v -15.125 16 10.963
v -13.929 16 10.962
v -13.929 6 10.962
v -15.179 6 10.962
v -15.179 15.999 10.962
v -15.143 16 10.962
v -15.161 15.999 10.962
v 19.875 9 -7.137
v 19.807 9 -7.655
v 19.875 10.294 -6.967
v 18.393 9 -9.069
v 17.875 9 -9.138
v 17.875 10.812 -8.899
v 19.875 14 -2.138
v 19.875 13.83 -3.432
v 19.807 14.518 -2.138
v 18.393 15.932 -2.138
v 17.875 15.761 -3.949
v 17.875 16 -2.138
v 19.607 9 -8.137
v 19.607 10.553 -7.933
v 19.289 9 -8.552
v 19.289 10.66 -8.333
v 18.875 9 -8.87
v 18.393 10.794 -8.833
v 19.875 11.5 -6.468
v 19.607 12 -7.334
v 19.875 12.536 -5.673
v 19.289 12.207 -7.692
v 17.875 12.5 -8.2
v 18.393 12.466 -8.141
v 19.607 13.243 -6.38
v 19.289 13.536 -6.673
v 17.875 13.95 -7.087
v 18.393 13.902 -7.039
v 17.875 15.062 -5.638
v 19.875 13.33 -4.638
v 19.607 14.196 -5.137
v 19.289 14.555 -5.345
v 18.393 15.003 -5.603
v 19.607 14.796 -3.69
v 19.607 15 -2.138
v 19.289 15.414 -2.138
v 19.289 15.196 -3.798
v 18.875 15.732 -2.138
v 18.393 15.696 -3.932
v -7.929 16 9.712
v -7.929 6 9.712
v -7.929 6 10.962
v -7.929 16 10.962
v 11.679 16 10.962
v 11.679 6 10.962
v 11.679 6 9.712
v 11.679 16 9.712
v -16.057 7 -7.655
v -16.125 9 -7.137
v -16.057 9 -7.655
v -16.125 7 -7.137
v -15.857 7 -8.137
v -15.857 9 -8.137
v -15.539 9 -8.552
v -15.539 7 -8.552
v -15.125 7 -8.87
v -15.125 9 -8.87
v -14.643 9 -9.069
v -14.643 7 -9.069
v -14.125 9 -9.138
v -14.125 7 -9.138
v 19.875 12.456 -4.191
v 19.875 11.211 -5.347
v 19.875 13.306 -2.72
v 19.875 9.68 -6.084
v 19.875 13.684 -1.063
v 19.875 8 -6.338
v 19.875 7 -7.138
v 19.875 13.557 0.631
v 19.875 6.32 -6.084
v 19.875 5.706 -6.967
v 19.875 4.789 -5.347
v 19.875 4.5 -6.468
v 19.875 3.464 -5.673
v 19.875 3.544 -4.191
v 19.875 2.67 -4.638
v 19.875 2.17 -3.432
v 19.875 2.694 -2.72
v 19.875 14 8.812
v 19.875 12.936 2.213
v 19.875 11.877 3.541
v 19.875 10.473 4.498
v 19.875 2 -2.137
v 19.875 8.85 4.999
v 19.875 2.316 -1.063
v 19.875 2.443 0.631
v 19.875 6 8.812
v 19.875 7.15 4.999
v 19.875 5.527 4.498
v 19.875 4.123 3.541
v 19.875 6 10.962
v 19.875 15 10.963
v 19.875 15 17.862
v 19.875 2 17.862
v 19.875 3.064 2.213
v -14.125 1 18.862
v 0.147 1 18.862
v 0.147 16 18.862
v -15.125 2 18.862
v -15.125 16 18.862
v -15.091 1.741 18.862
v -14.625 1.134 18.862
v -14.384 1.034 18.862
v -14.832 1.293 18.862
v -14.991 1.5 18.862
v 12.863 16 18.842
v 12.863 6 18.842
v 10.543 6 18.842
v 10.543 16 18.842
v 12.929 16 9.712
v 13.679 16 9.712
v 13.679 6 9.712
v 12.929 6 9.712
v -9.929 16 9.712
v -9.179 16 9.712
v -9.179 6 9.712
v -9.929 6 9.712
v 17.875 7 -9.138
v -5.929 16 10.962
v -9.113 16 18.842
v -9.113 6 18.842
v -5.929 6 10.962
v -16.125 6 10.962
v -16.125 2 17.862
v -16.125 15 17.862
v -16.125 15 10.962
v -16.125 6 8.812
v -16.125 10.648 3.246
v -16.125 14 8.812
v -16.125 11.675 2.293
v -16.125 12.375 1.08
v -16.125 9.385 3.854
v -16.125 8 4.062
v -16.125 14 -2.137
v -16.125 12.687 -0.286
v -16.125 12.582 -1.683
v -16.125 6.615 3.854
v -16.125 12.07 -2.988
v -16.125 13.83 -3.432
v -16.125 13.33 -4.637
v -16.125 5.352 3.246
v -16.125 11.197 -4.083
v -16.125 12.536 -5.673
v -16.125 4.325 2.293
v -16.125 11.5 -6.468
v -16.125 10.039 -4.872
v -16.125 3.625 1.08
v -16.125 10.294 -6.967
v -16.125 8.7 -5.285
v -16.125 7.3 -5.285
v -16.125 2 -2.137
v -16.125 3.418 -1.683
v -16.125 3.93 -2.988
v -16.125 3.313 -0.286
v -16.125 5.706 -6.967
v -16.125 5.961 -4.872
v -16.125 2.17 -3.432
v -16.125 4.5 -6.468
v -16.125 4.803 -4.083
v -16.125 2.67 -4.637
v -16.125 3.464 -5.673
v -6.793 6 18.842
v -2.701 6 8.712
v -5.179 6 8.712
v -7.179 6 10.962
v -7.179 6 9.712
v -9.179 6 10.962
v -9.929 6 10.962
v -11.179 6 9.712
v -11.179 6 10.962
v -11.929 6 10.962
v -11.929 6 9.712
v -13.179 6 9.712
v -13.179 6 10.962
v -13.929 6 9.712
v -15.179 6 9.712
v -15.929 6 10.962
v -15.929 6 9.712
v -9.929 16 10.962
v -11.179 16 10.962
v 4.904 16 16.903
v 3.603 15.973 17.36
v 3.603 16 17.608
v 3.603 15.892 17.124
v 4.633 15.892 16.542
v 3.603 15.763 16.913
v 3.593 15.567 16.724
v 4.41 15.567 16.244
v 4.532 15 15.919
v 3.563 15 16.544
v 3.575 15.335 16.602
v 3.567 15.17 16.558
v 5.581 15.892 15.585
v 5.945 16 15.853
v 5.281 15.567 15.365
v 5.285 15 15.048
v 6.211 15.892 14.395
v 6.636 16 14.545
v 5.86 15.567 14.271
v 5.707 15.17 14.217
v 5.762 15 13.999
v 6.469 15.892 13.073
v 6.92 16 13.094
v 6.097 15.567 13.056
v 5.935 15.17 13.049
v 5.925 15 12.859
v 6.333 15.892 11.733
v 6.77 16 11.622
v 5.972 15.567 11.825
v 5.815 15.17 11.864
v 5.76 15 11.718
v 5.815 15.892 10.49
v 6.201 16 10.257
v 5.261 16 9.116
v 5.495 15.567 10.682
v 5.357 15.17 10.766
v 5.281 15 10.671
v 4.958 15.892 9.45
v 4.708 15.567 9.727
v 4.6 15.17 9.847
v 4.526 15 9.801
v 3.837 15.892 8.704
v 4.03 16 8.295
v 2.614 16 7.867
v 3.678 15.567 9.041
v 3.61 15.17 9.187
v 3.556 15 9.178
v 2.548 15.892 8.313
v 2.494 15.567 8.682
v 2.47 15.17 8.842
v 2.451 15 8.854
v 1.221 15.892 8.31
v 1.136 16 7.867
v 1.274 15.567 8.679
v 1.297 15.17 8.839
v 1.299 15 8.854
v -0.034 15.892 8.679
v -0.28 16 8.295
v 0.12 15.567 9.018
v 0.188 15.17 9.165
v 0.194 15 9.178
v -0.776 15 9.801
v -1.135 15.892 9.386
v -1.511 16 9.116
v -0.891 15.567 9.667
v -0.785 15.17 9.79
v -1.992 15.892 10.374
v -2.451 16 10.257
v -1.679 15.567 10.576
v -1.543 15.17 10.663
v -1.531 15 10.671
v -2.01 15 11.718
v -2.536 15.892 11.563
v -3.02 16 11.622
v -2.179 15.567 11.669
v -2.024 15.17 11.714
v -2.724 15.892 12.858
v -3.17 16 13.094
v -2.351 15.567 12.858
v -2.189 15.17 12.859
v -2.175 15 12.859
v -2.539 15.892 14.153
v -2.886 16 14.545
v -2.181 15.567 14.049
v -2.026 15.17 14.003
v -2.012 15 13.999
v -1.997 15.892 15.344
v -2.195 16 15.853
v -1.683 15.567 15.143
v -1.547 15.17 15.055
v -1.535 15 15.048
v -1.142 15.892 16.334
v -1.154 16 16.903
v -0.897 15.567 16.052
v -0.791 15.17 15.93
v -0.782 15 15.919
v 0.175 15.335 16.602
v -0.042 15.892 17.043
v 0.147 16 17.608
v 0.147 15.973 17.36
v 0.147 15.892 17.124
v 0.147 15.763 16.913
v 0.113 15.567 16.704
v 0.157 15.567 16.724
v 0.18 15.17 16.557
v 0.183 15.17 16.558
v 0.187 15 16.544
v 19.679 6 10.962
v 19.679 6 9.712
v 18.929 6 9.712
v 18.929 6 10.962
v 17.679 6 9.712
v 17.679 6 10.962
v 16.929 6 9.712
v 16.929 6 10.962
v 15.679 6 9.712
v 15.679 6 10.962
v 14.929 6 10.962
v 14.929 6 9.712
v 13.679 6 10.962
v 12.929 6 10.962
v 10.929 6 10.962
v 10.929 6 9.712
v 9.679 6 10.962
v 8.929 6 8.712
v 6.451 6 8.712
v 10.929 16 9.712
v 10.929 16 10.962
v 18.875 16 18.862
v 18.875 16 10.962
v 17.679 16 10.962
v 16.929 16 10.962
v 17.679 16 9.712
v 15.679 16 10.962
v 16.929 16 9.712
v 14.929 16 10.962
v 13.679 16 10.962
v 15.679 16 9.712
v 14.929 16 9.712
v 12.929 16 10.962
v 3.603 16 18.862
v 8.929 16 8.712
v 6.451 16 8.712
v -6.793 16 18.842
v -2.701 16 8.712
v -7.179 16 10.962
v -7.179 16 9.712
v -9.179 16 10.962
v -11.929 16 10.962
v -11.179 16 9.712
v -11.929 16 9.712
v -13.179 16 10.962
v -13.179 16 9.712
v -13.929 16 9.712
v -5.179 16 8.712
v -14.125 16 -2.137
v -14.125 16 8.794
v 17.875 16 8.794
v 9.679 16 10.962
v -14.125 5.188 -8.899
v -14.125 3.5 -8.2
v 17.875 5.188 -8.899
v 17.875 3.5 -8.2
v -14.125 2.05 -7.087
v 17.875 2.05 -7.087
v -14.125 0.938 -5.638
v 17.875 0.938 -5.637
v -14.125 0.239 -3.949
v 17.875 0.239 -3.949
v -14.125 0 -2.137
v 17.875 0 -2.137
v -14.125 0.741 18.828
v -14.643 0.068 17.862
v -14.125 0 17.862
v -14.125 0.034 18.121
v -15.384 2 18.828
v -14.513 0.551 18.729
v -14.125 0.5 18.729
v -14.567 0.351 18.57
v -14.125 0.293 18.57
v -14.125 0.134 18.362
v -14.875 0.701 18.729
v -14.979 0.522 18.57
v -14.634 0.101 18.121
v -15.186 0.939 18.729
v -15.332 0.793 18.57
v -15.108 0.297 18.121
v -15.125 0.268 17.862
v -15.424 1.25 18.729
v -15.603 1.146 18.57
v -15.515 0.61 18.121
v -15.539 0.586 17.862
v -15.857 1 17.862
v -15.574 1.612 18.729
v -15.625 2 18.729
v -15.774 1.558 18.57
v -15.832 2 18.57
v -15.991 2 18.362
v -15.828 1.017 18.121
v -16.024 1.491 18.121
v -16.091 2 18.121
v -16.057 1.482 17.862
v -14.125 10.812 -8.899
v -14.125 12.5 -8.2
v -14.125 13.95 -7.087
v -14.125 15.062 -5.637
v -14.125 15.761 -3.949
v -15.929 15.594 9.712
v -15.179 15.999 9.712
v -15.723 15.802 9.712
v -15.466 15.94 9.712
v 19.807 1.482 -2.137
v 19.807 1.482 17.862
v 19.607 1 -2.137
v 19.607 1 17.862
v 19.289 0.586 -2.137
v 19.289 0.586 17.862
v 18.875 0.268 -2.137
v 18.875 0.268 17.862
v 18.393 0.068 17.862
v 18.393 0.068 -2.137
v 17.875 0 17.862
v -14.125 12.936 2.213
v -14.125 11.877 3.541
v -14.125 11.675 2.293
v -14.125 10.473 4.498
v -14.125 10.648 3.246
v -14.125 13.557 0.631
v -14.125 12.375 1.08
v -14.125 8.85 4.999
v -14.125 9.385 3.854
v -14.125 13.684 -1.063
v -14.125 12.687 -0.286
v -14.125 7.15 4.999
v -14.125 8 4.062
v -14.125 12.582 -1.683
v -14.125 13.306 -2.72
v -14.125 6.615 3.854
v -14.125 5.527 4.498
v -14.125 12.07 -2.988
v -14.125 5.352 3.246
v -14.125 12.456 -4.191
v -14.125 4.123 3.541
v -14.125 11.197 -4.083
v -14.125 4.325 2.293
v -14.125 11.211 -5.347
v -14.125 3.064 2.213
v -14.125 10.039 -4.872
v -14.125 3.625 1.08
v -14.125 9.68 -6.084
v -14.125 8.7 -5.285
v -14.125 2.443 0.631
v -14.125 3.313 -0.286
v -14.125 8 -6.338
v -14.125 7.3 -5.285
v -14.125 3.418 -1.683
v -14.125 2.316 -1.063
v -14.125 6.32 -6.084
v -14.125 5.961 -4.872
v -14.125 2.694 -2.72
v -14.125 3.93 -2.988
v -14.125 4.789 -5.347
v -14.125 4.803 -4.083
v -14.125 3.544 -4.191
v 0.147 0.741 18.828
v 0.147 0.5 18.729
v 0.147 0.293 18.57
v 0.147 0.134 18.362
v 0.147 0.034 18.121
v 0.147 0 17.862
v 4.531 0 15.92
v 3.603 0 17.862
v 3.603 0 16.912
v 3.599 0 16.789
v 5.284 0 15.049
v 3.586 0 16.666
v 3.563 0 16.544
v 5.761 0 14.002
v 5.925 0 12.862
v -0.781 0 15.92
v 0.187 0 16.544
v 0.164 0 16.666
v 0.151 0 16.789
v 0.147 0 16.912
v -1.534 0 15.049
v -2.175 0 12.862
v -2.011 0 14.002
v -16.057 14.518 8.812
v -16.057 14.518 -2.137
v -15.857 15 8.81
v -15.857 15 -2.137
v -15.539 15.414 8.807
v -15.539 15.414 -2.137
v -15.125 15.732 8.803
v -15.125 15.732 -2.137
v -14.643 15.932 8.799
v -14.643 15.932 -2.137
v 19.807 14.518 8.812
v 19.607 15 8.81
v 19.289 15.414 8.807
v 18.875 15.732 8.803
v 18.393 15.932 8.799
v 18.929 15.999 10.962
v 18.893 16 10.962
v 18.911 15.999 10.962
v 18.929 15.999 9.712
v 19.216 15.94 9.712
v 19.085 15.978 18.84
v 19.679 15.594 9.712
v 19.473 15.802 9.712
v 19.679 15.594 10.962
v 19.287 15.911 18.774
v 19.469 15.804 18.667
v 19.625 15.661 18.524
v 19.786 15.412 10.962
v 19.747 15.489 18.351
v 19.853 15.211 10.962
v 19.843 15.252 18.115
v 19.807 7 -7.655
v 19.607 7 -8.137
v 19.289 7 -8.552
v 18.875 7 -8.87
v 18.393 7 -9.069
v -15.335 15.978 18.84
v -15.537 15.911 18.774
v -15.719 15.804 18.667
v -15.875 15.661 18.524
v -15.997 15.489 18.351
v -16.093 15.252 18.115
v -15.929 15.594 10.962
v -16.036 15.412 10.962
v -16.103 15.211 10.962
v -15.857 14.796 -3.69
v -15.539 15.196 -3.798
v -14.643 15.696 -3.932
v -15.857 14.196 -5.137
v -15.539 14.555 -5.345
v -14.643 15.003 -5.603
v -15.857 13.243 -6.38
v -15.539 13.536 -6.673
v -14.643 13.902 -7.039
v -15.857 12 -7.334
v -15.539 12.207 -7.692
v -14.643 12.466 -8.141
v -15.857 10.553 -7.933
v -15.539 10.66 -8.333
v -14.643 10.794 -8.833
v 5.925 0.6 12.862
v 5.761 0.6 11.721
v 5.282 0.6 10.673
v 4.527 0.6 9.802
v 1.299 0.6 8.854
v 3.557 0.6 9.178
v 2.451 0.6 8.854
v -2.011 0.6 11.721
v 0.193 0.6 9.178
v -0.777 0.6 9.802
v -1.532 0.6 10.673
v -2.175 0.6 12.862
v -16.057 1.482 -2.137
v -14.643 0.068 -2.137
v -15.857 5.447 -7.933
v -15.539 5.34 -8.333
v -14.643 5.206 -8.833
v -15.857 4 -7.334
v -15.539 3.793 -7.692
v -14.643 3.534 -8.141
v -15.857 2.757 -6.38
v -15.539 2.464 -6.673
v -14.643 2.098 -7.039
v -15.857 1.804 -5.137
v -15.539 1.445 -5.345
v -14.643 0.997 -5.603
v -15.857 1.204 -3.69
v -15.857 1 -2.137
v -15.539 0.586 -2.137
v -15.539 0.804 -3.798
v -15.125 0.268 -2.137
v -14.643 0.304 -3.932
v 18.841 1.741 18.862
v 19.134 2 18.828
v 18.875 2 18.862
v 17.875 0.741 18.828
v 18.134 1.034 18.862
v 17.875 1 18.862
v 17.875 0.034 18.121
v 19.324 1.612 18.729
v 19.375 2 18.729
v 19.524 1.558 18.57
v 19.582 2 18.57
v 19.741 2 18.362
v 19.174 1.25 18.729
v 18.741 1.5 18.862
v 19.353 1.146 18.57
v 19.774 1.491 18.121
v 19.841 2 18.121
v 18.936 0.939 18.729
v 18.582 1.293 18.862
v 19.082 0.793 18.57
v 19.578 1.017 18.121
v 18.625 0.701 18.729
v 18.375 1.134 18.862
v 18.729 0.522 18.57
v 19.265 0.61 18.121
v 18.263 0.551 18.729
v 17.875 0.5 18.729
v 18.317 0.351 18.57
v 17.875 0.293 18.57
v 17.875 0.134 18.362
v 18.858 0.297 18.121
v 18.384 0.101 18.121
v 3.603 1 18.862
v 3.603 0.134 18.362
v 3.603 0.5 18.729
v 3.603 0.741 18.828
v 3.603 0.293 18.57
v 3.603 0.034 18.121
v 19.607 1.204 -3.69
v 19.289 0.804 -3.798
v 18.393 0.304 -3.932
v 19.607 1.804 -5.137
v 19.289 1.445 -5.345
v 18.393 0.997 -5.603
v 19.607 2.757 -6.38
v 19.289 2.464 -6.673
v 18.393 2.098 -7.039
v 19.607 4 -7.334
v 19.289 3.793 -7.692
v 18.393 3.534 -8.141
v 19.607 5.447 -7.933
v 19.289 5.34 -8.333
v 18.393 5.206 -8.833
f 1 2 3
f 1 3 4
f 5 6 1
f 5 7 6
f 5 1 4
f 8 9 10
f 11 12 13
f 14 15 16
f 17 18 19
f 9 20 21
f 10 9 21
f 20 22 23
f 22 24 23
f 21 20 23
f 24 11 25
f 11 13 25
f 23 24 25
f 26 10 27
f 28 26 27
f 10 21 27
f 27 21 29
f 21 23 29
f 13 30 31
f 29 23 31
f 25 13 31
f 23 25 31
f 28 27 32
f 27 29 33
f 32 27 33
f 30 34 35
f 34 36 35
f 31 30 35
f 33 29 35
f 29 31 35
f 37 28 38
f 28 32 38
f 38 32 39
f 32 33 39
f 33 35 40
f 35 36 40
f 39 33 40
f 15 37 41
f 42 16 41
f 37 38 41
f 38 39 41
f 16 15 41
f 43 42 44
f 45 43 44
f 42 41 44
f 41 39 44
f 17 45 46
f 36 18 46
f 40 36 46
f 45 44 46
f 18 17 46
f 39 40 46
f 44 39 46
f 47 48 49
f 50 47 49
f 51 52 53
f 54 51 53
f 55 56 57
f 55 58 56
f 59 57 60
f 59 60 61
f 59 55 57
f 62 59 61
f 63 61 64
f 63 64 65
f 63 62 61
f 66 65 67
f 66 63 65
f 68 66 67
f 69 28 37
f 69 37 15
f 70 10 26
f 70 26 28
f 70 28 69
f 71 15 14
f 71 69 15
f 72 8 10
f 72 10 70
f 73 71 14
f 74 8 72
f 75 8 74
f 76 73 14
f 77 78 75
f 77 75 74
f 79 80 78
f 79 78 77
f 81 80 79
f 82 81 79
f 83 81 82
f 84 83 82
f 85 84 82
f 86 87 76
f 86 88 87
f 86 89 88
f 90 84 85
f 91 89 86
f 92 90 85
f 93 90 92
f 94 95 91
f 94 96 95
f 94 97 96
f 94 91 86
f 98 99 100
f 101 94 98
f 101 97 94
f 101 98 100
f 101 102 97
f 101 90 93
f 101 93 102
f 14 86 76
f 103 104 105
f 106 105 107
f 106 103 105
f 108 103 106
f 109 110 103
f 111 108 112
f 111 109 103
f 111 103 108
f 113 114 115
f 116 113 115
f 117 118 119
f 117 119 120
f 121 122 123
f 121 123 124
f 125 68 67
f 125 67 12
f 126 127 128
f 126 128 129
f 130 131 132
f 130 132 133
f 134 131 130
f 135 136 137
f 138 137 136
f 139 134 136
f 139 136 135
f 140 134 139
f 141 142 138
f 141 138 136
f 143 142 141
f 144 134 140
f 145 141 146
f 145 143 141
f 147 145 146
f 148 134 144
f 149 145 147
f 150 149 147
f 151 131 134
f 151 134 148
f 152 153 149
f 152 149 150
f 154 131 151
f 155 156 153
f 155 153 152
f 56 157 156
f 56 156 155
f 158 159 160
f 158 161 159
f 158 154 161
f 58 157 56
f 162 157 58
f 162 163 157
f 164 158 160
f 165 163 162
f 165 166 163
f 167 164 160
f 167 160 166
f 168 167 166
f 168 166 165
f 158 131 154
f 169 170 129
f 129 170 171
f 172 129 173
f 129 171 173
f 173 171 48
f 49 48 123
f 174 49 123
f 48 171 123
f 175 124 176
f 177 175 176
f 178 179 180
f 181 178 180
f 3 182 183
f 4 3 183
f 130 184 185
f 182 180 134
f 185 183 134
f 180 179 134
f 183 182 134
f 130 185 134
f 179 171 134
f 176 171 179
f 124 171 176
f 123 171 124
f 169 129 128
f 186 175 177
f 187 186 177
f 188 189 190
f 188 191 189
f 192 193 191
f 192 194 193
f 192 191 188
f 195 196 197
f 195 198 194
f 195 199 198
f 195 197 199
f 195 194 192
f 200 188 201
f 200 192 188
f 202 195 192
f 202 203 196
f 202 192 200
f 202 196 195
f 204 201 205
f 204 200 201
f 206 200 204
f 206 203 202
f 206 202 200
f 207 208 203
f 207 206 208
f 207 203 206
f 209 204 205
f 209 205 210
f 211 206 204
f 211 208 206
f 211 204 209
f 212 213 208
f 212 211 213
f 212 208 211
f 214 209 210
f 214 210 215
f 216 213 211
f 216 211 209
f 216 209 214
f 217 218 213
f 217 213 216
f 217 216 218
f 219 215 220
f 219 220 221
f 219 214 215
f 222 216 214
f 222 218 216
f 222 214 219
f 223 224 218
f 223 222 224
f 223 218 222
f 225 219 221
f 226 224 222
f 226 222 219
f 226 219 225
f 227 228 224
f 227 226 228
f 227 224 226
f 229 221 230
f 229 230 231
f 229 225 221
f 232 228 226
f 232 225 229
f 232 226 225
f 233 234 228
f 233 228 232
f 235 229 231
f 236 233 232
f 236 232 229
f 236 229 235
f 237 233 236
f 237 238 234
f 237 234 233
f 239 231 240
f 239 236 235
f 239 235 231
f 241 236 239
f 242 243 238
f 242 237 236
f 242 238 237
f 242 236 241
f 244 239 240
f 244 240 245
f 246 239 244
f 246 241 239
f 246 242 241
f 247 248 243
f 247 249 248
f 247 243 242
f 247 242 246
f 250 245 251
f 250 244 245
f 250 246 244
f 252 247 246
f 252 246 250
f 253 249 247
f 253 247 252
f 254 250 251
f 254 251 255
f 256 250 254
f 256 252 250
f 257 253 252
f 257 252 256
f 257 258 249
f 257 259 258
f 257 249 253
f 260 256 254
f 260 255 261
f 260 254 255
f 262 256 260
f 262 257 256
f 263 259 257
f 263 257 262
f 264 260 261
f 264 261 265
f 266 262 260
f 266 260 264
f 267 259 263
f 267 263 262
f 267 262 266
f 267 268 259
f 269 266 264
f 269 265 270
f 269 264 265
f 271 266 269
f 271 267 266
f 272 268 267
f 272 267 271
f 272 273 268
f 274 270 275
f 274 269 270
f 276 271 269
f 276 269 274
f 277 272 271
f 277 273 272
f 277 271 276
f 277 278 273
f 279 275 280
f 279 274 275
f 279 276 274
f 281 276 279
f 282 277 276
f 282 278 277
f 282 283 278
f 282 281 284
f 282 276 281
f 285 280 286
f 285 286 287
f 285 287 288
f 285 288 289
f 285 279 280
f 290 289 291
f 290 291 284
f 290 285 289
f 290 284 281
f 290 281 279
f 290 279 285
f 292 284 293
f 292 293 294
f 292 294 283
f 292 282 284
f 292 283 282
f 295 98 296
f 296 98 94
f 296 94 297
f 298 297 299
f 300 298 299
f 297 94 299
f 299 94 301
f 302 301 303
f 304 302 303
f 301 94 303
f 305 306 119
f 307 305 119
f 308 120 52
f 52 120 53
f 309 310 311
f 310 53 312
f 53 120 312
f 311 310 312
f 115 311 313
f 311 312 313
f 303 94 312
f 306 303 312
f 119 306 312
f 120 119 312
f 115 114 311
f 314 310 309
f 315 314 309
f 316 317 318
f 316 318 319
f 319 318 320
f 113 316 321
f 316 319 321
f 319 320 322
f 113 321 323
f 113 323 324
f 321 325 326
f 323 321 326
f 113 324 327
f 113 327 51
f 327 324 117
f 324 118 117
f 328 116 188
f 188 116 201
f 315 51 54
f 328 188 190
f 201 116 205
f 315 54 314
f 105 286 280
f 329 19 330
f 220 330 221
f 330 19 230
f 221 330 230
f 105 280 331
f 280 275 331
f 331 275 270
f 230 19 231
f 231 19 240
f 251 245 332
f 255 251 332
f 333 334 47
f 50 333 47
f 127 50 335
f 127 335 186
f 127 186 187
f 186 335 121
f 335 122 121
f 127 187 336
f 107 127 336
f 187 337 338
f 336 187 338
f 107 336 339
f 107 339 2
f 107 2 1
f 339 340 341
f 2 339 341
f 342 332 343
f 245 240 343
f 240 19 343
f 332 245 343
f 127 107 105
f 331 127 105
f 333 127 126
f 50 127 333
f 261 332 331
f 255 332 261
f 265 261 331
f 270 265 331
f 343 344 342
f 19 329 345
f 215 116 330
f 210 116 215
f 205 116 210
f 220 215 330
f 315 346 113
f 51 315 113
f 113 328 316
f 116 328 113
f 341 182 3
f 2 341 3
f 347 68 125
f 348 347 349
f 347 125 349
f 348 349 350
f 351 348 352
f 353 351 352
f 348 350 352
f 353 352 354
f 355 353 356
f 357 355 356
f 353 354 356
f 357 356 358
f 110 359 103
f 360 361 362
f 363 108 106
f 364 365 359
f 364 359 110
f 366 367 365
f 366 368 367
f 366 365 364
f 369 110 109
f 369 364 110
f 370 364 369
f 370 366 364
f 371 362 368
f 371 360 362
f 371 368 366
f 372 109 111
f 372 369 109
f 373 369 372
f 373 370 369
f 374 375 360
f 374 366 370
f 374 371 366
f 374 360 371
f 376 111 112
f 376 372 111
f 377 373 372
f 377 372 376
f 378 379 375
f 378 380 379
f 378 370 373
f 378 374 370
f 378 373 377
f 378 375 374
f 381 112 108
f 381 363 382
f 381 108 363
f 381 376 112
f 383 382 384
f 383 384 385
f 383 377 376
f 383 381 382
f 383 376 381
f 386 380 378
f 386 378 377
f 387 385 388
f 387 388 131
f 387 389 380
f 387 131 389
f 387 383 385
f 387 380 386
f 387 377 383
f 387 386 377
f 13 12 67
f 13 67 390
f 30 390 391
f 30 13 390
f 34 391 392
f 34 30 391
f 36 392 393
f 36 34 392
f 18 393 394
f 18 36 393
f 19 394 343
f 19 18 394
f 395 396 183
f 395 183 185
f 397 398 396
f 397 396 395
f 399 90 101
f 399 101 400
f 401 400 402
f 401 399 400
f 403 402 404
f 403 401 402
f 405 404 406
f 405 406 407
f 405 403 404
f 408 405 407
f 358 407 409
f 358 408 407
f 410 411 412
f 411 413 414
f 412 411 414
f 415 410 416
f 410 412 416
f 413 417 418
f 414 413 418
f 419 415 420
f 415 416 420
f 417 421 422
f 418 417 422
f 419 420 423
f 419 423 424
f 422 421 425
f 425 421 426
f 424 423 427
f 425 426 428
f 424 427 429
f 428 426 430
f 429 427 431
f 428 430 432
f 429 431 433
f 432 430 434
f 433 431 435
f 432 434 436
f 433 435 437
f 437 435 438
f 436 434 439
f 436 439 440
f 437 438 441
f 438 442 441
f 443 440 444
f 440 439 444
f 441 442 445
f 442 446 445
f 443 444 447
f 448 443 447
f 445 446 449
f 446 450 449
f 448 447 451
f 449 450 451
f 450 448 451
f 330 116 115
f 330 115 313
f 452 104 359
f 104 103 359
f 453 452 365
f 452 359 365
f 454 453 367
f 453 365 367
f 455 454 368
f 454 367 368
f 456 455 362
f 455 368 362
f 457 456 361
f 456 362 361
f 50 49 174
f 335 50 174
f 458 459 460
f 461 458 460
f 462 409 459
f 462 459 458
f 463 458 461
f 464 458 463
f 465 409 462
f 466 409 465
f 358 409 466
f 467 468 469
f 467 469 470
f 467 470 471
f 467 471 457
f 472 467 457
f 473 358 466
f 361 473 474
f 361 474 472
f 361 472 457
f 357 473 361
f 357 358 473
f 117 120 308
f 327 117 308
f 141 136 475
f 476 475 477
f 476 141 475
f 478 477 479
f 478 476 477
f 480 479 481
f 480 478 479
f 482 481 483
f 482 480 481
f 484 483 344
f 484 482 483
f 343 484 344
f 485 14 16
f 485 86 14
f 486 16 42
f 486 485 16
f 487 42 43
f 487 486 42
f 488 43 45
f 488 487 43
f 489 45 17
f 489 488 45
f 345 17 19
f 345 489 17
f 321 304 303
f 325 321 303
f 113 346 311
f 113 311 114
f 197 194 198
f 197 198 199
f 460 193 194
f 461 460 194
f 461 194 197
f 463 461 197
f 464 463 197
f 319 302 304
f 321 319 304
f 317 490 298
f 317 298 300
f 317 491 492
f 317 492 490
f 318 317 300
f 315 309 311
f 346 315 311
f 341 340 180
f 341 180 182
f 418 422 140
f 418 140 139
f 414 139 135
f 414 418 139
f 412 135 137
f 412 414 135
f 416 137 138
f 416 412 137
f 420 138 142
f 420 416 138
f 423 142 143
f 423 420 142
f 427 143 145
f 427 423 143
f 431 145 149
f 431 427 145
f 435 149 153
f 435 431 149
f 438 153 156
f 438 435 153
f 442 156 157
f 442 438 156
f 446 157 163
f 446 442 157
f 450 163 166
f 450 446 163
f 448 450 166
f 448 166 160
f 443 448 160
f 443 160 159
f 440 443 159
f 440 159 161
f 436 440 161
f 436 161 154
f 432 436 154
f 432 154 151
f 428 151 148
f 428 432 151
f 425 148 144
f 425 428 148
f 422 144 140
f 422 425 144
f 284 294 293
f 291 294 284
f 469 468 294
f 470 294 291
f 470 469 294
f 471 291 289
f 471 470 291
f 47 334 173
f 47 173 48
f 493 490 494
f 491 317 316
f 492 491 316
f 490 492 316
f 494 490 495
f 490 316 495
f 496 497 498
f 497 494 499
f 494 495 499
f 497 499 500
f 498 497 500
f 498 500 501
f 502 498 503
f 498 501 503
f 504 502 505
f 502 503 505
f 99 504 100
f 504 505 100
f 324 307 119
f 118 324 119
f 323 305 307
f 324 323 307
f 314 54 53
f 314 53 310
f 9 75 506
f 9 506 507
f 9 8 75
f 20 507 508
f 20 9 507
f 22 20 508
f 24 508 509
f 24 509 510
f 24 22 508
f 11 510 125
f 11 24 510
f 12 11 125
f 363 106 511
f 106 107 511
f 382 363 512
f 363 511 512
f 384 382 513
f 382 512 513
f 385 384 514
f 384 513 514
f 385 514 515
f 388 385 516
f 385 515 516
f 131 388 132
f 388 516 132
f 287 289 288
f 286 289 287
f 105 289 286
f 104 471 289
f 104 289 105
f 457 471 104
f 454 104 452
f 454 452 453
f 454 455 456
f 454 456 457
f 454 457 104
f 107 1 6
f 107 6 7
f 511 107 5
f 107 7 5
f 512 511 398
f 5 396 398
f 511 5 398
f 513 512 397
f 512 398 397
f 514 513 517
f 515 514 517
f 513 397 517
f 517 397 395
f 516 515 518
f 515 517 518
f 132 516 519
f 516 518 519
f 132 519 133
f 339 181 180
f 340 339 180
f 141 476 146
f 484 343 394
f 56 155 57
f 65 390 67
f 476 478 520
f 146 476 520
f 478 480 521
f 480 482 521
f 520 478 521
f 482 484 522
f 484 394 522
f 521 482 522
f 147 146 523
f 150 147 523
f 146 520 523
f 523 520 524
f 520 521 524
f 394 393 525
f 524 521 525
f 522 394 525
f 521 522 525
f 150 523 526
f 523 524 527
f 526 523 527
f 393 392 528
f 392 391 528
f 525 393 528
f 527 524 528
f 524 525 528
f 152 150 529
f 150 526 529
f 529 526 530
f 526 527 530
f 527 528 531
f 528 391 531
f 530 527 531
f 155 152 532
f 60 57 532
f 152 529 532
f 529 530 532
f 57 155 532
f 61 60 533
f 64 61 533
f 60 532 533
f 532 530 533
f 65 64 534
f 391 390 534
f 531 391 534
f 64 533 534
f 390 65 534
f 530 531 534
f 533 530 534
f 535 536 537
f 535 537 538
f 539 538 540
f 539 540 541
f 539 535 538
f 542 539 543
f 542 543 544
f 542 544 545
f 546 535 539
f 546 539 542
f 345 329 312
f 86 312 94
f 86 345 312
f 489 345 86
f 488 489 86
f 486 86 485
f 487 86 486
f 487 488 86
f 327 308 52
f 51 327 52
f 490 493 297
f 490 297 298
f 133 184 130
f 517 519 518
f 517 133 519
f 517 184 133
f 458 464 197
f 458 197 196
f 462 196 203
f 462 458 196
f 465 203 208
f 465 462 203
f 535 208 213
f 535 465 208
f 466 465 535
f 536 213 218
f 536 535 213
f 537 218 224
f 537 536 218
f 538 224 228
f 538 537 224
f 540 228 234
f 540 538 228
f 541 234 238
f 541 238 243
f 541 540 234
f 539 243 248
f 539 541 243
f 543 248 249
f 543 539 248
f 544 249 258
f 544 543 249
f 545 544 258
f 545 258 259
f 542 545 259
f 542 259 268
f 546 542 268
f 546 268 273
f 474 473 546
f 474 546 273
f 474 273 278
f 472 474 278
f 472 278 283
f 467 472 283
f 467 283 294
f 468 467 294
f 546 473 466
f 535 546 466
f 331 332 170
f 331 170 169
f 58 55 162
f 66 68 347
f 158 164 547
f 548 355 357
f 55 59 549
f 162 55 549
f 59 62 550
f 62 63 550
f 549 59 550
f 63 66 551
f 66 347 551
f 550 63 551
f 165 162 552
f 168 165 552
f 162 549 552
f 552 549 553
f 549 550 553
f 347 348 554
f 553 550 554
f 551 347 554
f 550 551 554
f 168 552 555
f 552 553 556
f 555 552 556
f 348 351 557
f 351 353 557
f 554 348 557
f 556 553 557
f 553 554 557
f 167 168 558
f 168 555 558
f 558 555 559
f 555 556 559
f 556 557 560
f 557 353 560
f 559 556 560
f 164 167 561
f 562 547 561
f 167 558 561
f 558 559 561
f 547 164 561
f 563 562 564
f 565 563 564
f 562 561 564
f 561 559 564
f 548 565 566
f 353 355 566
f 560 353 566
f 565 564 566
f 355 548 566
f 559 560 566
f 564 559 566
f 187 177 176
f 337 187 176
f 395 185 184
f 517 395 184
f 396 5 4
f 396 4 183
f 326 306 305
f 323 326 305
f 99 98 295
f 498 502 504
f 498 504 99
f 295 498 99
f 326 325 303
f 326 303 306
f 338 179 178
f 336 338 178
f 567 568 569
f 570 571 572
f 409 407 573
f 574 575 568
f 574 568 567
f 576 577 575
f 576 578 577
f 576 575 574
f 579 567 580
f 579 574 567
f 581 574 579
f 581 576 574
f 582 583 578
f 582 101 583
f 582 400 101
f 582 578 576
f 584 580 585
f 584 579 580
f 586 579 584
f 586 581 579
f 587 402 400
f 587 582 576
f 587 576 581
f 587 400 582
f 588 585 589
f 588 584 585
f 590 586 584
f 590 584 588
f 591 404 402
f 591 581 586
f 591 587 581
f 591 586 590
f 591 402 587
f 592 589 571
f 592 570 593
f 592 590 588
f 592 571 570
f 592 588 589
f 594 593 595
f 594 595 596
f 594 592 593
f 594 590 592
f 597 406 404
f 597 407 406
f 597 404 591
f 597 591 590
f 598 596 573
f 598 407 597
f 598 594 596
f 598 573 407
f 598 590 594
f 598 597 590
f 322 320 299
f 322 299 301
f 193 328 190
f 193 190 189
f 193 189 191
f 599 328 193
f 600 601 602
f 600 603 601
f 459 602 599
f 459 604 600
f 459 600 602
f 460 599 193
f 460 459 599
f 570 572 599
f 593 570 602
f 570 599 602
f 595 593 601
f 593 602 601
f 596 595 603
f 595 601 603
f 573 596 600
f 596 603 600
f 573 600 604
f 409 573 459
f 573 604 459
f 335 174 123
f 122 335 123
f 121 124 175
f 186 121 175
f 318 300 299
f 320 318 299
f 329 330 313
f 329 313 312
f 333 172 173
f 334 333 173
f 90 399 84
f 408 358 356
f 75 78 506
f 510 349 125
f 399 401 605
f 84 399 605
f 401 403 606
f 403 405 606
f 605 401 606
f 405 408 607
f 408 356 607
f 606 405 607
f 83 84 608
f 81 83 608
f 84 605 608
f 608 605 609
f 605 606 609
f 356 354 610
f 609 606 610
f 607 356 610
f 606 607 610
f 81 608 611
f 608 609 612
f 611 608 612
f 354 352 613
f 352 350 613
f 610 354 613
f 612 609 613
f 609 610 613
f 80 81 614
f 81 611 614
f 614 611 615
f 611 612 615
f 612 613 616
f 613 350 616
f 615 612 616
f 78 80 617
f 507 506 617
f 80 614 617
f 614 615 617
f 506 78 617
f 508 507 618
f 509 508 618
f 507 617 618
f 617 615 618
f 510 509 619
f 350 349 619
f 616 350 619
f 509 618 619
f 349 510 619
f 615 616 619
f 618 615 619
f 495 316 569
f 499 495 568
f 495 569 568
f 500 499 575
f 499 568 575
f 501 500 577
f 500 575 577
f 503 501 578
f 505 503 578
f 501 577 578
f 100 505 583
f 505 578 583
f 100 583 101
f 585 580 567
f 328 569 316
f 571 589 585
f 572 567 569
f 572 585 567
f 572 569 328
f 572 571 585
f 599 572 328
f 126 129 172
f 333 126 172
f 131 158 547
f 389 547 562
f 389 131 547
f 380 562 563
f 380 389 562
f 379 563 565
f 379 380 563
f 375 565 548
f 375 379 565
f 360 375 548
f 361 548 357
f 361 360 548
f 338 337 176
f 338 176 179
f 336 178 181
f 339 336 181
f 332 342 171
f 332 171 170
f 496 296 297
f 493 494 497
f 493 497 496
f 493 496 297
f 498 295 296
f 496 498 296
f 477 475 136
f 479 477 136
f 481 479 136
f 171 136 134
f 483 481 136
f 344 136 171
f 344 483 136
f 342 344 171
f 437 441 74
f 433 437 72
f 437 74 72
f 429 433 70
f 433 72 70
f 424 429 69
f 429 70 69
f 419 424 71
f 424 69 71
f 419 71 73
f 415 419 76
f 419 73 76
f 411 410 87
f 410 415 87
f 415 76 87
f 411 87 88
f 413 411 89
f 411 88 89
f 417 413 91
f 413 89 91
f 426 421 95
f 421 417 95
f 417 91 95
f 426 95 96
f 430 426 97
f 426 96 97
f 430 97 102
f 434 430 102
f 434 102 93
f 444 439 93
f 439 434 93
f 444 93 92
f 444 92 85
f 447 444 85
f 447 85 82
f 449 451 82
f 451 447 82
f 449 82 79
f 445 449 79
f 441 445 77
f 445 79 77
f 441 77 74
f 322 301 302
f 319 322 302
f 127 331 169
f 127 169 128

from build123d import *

# Parameters (mm, degrees)
SALIENTE_EXTRUIR1_DEPTH = 16
CROQUIS5_R              = 5.7
CORTAR_EXTRUIR1_DEPTH   = 38
SALIENTE_EXTRUIR2_DEPTH = 0.6
CORTAR_EXTRUIR2_DEPTH   = 10
REDONDEO1_R             = 7
REDONDEO2_R             = 2
REDONDEO3_R             = 1
REDONDEO5_R             = 1
SALIENTE_EXTRUIR3_START = -2
CROQUIS10_R             = 5.7
CROQUIS10_R_2           = 4.7
SALIENTE_EXTRUIR3_DEPTH = 2


with BuildPart() as part:
    # Croquis1 → Saliente-Extruir1 (new body)
    with BuildSketch(Plane(origin=(0, 0, 0), x_dir=(1, 0, 0), z_dir=(0, 1, 0))):
        with BuildLine():
            Line((-16.125, 9.1375), (19.875, 9.1375))
            Line((19.875, 9.1375), (19.875, -18.8625))
            Line((19.875, -18.8625), (3.603278106, -18.8625))
            Line((3.603278106, -18.8625), (3.603278106, -16.9125))
            ThreePointArc((3.603278106, -16.9125), (3.593299591, -16.727049938), (3.563479273, -16.543741332))
            ThreePointArc((3.563479273, -16.543741332), (1.875, -8.8125), (0.186520727, -16.543741332))
            ThreePointArc((0.186520727, -16.543741332), (0.156700409, -16.727049938), (0.146721894, -16.9125))
            Line((0.146721894, -16.9125), (0.146721894, -18.8625))
            Line((0.146721894, -18.8625), (-16.125, -18.8625))
            Line((-16.125, -18.8625), (-16.125, 9.1375))
        make_face()
    extrude(amount=SALIENTE_EXTRUIR1_DEPTH)

    # Croquis5 → Cortar-Extruir1 (cut)
    with BuildSketch(Plane(origin=(19.875, 0, 0), x_dir=(0, 0, -1), z_dir=(1, 0, 0))):
        with Locations((0.6375, 8)):
            Circle(CROQUIS5_R)
    extrude(amount=-CORTAR_EXTRUIR1_DEPTH, mode=Mode.SUBTRACT)

    # Croquis8 → Saliente-Extruir2 (add)
    with BuildSketch(Plane.XZ):
        with BuildLine():
            Line((-2.175, 12.8625), (5.925, 12.8625))
            ThreePointArc((5.925, 12.8625), (1.875, 8.8125), (-2.175, 12.8625))
        make_face()
    extrude(amount=-SALIENTE_EXTRUIR2_DEPTH)

    # Croquis9 → Cortar-Extruir2 (cut)
    with BuildSketch(Plane(origin=(0, 16, 0), x_dir=(1, 0, 0), z_dir=(0, 1, 0))):
        Polygon((-15.929202857, -9.7125), (-15.929202857, -10.9625), (-16.125, -10.9625), (-16.125, -8.8125), (-5.179202857, -8.7125), (-2.700687259, -8.7125), (-6.793467705, -18.842487075), (-9.112924295, -18.842487075), (-5.929202857, -10.9625), (-7.179202857, -10.9625), (-7.179202857, -9.7125), (-7.929202857, -9.7125), (-7.929202857, -10.9625), (-9.179202857, -10.9625), (-9.179202857, -9.7125), (-9.929202857, -9.7125), (-9.929202857, -10.9625), (-11.179202857, -10.9625), (-11.179202857, -9.7125), (-11.929202857, -9.7125), (-11.929202857, -10.9625), (-13.179202857, -10.9625), (-13.179202857, -9.7125), (-13.929202857, -9.7125), (-13.929202857, -10.9625), (-15.179202857, -10.9625), (-15.179202857, -9.7125), align=None)
        Polygon((12.862924295, -18.842487075), (10.543467705, -18.842487075), (6.450687259, -8.7125), (8.929202857, -8.7125), (19.875, -8.8125), (19.875, -10.9625), (19.679202857, -10.9625), (19.679202857, -9.7125), (18.929202857, -9.7125), (18.929202857, -10.9625), (17.679202857, -10.9625), (17.679202857, -9.7125), (16.929202857, -9.7125), (16.929202857, -10.9625), (15.679202857, -10.9625), (15.679202857, -9.7125), (14.929202857, -9.7125), (14.929202857, -10.9625), (13.679202857, -10.9625), (13.679202857, -9.7125), (12.929202857, -9.7125), (12.929202857, -10.9625), (11.679202857, -10.9625), (11.679202857, -9.7125), (10.929202857, -9.7125), (10.929202857, -10.9625), (9.679202857, -10.9625), align=None)
    extrude(amount=-CORTAR_EXTRUIR2_DEPTH, mode=Mode.SUBTRACT)

    # Redondeo1
    redondeo1_edges = [part.edges().sort_by_distance(p)[0] for p in [
        (1.875, 16, -9.1375),
        (1.875, 0, -9.1375),
    ]]
    fillet(redondeo1_edges, radius=REDONDEO1_R)

    # Redondeo2
    redondeo2_edges = [part.edges().sort_by_distance(p)[0] for p in [
        (19.875, 16, 3.3375),
        (-16.125, 16, 3.3375),
        (-16.125, 8, -9.1375),
        (-16.125, 0, 8.3625),
        (-16.125, 2.050252532, -7.087247468),
        (-16.125, 13.949747468, -7.087247468),
        (19.875, 8, -9.1375),
        (19.875, 2.050252532, -7.087247468),
        (19.875, 13.949747468, -7.087247468),
        (19.875, 0, 8.3625),
    ]]
    fillet(redondeo2_edges, radius=REDONDEO2_R)

    # Redondeo3
    redondeo3_edges = [part.edges().sort_by_distance(p)[0] for p in [
        (1.875, 16, 8.8125),
    ]]
    fillet(redondeo3_edges, radius=REDONDEO3_R)

    # Redondeo5
    redondeo5_edges = [part.edges().sort_by_distance(p)[0] for p in [
        (10.739139053, 0, 18.8625),
        (19.289213562, 0.585786438, 18.8625),
        (-6.989139053, 0, 18.8625),
        (-15.539213562, 0.585786438, 18.8625),
        (19.875, 9, 18.8625),
        (-16.125, 9, 18.8625),
        (-16.125, 16, 14.9125),
        (19.875, 16, 14.9125),
    ]]
    fillet(redondeo5_edges, radius=REDONDEO5_R)

    # Croquis10 → Saliente-Extruir3 (add)
    with BuildSketch(Plane.ZY.offset(16.125).offset(SALIENTE_EXTRUIR3_START)):
        with Locations(Location((-0.6375, 8, 0), (0, 0, 180))):
            Circle(CROQUIS10_R)
        with Locations((-0.6375, 8)):
            Circle(CROQUIS10_R_2, mode=Mode.SUBTRACT)
    extrude(amount=SALIENTE_EXTRUIR3_DEPTH)


solid = part.part
